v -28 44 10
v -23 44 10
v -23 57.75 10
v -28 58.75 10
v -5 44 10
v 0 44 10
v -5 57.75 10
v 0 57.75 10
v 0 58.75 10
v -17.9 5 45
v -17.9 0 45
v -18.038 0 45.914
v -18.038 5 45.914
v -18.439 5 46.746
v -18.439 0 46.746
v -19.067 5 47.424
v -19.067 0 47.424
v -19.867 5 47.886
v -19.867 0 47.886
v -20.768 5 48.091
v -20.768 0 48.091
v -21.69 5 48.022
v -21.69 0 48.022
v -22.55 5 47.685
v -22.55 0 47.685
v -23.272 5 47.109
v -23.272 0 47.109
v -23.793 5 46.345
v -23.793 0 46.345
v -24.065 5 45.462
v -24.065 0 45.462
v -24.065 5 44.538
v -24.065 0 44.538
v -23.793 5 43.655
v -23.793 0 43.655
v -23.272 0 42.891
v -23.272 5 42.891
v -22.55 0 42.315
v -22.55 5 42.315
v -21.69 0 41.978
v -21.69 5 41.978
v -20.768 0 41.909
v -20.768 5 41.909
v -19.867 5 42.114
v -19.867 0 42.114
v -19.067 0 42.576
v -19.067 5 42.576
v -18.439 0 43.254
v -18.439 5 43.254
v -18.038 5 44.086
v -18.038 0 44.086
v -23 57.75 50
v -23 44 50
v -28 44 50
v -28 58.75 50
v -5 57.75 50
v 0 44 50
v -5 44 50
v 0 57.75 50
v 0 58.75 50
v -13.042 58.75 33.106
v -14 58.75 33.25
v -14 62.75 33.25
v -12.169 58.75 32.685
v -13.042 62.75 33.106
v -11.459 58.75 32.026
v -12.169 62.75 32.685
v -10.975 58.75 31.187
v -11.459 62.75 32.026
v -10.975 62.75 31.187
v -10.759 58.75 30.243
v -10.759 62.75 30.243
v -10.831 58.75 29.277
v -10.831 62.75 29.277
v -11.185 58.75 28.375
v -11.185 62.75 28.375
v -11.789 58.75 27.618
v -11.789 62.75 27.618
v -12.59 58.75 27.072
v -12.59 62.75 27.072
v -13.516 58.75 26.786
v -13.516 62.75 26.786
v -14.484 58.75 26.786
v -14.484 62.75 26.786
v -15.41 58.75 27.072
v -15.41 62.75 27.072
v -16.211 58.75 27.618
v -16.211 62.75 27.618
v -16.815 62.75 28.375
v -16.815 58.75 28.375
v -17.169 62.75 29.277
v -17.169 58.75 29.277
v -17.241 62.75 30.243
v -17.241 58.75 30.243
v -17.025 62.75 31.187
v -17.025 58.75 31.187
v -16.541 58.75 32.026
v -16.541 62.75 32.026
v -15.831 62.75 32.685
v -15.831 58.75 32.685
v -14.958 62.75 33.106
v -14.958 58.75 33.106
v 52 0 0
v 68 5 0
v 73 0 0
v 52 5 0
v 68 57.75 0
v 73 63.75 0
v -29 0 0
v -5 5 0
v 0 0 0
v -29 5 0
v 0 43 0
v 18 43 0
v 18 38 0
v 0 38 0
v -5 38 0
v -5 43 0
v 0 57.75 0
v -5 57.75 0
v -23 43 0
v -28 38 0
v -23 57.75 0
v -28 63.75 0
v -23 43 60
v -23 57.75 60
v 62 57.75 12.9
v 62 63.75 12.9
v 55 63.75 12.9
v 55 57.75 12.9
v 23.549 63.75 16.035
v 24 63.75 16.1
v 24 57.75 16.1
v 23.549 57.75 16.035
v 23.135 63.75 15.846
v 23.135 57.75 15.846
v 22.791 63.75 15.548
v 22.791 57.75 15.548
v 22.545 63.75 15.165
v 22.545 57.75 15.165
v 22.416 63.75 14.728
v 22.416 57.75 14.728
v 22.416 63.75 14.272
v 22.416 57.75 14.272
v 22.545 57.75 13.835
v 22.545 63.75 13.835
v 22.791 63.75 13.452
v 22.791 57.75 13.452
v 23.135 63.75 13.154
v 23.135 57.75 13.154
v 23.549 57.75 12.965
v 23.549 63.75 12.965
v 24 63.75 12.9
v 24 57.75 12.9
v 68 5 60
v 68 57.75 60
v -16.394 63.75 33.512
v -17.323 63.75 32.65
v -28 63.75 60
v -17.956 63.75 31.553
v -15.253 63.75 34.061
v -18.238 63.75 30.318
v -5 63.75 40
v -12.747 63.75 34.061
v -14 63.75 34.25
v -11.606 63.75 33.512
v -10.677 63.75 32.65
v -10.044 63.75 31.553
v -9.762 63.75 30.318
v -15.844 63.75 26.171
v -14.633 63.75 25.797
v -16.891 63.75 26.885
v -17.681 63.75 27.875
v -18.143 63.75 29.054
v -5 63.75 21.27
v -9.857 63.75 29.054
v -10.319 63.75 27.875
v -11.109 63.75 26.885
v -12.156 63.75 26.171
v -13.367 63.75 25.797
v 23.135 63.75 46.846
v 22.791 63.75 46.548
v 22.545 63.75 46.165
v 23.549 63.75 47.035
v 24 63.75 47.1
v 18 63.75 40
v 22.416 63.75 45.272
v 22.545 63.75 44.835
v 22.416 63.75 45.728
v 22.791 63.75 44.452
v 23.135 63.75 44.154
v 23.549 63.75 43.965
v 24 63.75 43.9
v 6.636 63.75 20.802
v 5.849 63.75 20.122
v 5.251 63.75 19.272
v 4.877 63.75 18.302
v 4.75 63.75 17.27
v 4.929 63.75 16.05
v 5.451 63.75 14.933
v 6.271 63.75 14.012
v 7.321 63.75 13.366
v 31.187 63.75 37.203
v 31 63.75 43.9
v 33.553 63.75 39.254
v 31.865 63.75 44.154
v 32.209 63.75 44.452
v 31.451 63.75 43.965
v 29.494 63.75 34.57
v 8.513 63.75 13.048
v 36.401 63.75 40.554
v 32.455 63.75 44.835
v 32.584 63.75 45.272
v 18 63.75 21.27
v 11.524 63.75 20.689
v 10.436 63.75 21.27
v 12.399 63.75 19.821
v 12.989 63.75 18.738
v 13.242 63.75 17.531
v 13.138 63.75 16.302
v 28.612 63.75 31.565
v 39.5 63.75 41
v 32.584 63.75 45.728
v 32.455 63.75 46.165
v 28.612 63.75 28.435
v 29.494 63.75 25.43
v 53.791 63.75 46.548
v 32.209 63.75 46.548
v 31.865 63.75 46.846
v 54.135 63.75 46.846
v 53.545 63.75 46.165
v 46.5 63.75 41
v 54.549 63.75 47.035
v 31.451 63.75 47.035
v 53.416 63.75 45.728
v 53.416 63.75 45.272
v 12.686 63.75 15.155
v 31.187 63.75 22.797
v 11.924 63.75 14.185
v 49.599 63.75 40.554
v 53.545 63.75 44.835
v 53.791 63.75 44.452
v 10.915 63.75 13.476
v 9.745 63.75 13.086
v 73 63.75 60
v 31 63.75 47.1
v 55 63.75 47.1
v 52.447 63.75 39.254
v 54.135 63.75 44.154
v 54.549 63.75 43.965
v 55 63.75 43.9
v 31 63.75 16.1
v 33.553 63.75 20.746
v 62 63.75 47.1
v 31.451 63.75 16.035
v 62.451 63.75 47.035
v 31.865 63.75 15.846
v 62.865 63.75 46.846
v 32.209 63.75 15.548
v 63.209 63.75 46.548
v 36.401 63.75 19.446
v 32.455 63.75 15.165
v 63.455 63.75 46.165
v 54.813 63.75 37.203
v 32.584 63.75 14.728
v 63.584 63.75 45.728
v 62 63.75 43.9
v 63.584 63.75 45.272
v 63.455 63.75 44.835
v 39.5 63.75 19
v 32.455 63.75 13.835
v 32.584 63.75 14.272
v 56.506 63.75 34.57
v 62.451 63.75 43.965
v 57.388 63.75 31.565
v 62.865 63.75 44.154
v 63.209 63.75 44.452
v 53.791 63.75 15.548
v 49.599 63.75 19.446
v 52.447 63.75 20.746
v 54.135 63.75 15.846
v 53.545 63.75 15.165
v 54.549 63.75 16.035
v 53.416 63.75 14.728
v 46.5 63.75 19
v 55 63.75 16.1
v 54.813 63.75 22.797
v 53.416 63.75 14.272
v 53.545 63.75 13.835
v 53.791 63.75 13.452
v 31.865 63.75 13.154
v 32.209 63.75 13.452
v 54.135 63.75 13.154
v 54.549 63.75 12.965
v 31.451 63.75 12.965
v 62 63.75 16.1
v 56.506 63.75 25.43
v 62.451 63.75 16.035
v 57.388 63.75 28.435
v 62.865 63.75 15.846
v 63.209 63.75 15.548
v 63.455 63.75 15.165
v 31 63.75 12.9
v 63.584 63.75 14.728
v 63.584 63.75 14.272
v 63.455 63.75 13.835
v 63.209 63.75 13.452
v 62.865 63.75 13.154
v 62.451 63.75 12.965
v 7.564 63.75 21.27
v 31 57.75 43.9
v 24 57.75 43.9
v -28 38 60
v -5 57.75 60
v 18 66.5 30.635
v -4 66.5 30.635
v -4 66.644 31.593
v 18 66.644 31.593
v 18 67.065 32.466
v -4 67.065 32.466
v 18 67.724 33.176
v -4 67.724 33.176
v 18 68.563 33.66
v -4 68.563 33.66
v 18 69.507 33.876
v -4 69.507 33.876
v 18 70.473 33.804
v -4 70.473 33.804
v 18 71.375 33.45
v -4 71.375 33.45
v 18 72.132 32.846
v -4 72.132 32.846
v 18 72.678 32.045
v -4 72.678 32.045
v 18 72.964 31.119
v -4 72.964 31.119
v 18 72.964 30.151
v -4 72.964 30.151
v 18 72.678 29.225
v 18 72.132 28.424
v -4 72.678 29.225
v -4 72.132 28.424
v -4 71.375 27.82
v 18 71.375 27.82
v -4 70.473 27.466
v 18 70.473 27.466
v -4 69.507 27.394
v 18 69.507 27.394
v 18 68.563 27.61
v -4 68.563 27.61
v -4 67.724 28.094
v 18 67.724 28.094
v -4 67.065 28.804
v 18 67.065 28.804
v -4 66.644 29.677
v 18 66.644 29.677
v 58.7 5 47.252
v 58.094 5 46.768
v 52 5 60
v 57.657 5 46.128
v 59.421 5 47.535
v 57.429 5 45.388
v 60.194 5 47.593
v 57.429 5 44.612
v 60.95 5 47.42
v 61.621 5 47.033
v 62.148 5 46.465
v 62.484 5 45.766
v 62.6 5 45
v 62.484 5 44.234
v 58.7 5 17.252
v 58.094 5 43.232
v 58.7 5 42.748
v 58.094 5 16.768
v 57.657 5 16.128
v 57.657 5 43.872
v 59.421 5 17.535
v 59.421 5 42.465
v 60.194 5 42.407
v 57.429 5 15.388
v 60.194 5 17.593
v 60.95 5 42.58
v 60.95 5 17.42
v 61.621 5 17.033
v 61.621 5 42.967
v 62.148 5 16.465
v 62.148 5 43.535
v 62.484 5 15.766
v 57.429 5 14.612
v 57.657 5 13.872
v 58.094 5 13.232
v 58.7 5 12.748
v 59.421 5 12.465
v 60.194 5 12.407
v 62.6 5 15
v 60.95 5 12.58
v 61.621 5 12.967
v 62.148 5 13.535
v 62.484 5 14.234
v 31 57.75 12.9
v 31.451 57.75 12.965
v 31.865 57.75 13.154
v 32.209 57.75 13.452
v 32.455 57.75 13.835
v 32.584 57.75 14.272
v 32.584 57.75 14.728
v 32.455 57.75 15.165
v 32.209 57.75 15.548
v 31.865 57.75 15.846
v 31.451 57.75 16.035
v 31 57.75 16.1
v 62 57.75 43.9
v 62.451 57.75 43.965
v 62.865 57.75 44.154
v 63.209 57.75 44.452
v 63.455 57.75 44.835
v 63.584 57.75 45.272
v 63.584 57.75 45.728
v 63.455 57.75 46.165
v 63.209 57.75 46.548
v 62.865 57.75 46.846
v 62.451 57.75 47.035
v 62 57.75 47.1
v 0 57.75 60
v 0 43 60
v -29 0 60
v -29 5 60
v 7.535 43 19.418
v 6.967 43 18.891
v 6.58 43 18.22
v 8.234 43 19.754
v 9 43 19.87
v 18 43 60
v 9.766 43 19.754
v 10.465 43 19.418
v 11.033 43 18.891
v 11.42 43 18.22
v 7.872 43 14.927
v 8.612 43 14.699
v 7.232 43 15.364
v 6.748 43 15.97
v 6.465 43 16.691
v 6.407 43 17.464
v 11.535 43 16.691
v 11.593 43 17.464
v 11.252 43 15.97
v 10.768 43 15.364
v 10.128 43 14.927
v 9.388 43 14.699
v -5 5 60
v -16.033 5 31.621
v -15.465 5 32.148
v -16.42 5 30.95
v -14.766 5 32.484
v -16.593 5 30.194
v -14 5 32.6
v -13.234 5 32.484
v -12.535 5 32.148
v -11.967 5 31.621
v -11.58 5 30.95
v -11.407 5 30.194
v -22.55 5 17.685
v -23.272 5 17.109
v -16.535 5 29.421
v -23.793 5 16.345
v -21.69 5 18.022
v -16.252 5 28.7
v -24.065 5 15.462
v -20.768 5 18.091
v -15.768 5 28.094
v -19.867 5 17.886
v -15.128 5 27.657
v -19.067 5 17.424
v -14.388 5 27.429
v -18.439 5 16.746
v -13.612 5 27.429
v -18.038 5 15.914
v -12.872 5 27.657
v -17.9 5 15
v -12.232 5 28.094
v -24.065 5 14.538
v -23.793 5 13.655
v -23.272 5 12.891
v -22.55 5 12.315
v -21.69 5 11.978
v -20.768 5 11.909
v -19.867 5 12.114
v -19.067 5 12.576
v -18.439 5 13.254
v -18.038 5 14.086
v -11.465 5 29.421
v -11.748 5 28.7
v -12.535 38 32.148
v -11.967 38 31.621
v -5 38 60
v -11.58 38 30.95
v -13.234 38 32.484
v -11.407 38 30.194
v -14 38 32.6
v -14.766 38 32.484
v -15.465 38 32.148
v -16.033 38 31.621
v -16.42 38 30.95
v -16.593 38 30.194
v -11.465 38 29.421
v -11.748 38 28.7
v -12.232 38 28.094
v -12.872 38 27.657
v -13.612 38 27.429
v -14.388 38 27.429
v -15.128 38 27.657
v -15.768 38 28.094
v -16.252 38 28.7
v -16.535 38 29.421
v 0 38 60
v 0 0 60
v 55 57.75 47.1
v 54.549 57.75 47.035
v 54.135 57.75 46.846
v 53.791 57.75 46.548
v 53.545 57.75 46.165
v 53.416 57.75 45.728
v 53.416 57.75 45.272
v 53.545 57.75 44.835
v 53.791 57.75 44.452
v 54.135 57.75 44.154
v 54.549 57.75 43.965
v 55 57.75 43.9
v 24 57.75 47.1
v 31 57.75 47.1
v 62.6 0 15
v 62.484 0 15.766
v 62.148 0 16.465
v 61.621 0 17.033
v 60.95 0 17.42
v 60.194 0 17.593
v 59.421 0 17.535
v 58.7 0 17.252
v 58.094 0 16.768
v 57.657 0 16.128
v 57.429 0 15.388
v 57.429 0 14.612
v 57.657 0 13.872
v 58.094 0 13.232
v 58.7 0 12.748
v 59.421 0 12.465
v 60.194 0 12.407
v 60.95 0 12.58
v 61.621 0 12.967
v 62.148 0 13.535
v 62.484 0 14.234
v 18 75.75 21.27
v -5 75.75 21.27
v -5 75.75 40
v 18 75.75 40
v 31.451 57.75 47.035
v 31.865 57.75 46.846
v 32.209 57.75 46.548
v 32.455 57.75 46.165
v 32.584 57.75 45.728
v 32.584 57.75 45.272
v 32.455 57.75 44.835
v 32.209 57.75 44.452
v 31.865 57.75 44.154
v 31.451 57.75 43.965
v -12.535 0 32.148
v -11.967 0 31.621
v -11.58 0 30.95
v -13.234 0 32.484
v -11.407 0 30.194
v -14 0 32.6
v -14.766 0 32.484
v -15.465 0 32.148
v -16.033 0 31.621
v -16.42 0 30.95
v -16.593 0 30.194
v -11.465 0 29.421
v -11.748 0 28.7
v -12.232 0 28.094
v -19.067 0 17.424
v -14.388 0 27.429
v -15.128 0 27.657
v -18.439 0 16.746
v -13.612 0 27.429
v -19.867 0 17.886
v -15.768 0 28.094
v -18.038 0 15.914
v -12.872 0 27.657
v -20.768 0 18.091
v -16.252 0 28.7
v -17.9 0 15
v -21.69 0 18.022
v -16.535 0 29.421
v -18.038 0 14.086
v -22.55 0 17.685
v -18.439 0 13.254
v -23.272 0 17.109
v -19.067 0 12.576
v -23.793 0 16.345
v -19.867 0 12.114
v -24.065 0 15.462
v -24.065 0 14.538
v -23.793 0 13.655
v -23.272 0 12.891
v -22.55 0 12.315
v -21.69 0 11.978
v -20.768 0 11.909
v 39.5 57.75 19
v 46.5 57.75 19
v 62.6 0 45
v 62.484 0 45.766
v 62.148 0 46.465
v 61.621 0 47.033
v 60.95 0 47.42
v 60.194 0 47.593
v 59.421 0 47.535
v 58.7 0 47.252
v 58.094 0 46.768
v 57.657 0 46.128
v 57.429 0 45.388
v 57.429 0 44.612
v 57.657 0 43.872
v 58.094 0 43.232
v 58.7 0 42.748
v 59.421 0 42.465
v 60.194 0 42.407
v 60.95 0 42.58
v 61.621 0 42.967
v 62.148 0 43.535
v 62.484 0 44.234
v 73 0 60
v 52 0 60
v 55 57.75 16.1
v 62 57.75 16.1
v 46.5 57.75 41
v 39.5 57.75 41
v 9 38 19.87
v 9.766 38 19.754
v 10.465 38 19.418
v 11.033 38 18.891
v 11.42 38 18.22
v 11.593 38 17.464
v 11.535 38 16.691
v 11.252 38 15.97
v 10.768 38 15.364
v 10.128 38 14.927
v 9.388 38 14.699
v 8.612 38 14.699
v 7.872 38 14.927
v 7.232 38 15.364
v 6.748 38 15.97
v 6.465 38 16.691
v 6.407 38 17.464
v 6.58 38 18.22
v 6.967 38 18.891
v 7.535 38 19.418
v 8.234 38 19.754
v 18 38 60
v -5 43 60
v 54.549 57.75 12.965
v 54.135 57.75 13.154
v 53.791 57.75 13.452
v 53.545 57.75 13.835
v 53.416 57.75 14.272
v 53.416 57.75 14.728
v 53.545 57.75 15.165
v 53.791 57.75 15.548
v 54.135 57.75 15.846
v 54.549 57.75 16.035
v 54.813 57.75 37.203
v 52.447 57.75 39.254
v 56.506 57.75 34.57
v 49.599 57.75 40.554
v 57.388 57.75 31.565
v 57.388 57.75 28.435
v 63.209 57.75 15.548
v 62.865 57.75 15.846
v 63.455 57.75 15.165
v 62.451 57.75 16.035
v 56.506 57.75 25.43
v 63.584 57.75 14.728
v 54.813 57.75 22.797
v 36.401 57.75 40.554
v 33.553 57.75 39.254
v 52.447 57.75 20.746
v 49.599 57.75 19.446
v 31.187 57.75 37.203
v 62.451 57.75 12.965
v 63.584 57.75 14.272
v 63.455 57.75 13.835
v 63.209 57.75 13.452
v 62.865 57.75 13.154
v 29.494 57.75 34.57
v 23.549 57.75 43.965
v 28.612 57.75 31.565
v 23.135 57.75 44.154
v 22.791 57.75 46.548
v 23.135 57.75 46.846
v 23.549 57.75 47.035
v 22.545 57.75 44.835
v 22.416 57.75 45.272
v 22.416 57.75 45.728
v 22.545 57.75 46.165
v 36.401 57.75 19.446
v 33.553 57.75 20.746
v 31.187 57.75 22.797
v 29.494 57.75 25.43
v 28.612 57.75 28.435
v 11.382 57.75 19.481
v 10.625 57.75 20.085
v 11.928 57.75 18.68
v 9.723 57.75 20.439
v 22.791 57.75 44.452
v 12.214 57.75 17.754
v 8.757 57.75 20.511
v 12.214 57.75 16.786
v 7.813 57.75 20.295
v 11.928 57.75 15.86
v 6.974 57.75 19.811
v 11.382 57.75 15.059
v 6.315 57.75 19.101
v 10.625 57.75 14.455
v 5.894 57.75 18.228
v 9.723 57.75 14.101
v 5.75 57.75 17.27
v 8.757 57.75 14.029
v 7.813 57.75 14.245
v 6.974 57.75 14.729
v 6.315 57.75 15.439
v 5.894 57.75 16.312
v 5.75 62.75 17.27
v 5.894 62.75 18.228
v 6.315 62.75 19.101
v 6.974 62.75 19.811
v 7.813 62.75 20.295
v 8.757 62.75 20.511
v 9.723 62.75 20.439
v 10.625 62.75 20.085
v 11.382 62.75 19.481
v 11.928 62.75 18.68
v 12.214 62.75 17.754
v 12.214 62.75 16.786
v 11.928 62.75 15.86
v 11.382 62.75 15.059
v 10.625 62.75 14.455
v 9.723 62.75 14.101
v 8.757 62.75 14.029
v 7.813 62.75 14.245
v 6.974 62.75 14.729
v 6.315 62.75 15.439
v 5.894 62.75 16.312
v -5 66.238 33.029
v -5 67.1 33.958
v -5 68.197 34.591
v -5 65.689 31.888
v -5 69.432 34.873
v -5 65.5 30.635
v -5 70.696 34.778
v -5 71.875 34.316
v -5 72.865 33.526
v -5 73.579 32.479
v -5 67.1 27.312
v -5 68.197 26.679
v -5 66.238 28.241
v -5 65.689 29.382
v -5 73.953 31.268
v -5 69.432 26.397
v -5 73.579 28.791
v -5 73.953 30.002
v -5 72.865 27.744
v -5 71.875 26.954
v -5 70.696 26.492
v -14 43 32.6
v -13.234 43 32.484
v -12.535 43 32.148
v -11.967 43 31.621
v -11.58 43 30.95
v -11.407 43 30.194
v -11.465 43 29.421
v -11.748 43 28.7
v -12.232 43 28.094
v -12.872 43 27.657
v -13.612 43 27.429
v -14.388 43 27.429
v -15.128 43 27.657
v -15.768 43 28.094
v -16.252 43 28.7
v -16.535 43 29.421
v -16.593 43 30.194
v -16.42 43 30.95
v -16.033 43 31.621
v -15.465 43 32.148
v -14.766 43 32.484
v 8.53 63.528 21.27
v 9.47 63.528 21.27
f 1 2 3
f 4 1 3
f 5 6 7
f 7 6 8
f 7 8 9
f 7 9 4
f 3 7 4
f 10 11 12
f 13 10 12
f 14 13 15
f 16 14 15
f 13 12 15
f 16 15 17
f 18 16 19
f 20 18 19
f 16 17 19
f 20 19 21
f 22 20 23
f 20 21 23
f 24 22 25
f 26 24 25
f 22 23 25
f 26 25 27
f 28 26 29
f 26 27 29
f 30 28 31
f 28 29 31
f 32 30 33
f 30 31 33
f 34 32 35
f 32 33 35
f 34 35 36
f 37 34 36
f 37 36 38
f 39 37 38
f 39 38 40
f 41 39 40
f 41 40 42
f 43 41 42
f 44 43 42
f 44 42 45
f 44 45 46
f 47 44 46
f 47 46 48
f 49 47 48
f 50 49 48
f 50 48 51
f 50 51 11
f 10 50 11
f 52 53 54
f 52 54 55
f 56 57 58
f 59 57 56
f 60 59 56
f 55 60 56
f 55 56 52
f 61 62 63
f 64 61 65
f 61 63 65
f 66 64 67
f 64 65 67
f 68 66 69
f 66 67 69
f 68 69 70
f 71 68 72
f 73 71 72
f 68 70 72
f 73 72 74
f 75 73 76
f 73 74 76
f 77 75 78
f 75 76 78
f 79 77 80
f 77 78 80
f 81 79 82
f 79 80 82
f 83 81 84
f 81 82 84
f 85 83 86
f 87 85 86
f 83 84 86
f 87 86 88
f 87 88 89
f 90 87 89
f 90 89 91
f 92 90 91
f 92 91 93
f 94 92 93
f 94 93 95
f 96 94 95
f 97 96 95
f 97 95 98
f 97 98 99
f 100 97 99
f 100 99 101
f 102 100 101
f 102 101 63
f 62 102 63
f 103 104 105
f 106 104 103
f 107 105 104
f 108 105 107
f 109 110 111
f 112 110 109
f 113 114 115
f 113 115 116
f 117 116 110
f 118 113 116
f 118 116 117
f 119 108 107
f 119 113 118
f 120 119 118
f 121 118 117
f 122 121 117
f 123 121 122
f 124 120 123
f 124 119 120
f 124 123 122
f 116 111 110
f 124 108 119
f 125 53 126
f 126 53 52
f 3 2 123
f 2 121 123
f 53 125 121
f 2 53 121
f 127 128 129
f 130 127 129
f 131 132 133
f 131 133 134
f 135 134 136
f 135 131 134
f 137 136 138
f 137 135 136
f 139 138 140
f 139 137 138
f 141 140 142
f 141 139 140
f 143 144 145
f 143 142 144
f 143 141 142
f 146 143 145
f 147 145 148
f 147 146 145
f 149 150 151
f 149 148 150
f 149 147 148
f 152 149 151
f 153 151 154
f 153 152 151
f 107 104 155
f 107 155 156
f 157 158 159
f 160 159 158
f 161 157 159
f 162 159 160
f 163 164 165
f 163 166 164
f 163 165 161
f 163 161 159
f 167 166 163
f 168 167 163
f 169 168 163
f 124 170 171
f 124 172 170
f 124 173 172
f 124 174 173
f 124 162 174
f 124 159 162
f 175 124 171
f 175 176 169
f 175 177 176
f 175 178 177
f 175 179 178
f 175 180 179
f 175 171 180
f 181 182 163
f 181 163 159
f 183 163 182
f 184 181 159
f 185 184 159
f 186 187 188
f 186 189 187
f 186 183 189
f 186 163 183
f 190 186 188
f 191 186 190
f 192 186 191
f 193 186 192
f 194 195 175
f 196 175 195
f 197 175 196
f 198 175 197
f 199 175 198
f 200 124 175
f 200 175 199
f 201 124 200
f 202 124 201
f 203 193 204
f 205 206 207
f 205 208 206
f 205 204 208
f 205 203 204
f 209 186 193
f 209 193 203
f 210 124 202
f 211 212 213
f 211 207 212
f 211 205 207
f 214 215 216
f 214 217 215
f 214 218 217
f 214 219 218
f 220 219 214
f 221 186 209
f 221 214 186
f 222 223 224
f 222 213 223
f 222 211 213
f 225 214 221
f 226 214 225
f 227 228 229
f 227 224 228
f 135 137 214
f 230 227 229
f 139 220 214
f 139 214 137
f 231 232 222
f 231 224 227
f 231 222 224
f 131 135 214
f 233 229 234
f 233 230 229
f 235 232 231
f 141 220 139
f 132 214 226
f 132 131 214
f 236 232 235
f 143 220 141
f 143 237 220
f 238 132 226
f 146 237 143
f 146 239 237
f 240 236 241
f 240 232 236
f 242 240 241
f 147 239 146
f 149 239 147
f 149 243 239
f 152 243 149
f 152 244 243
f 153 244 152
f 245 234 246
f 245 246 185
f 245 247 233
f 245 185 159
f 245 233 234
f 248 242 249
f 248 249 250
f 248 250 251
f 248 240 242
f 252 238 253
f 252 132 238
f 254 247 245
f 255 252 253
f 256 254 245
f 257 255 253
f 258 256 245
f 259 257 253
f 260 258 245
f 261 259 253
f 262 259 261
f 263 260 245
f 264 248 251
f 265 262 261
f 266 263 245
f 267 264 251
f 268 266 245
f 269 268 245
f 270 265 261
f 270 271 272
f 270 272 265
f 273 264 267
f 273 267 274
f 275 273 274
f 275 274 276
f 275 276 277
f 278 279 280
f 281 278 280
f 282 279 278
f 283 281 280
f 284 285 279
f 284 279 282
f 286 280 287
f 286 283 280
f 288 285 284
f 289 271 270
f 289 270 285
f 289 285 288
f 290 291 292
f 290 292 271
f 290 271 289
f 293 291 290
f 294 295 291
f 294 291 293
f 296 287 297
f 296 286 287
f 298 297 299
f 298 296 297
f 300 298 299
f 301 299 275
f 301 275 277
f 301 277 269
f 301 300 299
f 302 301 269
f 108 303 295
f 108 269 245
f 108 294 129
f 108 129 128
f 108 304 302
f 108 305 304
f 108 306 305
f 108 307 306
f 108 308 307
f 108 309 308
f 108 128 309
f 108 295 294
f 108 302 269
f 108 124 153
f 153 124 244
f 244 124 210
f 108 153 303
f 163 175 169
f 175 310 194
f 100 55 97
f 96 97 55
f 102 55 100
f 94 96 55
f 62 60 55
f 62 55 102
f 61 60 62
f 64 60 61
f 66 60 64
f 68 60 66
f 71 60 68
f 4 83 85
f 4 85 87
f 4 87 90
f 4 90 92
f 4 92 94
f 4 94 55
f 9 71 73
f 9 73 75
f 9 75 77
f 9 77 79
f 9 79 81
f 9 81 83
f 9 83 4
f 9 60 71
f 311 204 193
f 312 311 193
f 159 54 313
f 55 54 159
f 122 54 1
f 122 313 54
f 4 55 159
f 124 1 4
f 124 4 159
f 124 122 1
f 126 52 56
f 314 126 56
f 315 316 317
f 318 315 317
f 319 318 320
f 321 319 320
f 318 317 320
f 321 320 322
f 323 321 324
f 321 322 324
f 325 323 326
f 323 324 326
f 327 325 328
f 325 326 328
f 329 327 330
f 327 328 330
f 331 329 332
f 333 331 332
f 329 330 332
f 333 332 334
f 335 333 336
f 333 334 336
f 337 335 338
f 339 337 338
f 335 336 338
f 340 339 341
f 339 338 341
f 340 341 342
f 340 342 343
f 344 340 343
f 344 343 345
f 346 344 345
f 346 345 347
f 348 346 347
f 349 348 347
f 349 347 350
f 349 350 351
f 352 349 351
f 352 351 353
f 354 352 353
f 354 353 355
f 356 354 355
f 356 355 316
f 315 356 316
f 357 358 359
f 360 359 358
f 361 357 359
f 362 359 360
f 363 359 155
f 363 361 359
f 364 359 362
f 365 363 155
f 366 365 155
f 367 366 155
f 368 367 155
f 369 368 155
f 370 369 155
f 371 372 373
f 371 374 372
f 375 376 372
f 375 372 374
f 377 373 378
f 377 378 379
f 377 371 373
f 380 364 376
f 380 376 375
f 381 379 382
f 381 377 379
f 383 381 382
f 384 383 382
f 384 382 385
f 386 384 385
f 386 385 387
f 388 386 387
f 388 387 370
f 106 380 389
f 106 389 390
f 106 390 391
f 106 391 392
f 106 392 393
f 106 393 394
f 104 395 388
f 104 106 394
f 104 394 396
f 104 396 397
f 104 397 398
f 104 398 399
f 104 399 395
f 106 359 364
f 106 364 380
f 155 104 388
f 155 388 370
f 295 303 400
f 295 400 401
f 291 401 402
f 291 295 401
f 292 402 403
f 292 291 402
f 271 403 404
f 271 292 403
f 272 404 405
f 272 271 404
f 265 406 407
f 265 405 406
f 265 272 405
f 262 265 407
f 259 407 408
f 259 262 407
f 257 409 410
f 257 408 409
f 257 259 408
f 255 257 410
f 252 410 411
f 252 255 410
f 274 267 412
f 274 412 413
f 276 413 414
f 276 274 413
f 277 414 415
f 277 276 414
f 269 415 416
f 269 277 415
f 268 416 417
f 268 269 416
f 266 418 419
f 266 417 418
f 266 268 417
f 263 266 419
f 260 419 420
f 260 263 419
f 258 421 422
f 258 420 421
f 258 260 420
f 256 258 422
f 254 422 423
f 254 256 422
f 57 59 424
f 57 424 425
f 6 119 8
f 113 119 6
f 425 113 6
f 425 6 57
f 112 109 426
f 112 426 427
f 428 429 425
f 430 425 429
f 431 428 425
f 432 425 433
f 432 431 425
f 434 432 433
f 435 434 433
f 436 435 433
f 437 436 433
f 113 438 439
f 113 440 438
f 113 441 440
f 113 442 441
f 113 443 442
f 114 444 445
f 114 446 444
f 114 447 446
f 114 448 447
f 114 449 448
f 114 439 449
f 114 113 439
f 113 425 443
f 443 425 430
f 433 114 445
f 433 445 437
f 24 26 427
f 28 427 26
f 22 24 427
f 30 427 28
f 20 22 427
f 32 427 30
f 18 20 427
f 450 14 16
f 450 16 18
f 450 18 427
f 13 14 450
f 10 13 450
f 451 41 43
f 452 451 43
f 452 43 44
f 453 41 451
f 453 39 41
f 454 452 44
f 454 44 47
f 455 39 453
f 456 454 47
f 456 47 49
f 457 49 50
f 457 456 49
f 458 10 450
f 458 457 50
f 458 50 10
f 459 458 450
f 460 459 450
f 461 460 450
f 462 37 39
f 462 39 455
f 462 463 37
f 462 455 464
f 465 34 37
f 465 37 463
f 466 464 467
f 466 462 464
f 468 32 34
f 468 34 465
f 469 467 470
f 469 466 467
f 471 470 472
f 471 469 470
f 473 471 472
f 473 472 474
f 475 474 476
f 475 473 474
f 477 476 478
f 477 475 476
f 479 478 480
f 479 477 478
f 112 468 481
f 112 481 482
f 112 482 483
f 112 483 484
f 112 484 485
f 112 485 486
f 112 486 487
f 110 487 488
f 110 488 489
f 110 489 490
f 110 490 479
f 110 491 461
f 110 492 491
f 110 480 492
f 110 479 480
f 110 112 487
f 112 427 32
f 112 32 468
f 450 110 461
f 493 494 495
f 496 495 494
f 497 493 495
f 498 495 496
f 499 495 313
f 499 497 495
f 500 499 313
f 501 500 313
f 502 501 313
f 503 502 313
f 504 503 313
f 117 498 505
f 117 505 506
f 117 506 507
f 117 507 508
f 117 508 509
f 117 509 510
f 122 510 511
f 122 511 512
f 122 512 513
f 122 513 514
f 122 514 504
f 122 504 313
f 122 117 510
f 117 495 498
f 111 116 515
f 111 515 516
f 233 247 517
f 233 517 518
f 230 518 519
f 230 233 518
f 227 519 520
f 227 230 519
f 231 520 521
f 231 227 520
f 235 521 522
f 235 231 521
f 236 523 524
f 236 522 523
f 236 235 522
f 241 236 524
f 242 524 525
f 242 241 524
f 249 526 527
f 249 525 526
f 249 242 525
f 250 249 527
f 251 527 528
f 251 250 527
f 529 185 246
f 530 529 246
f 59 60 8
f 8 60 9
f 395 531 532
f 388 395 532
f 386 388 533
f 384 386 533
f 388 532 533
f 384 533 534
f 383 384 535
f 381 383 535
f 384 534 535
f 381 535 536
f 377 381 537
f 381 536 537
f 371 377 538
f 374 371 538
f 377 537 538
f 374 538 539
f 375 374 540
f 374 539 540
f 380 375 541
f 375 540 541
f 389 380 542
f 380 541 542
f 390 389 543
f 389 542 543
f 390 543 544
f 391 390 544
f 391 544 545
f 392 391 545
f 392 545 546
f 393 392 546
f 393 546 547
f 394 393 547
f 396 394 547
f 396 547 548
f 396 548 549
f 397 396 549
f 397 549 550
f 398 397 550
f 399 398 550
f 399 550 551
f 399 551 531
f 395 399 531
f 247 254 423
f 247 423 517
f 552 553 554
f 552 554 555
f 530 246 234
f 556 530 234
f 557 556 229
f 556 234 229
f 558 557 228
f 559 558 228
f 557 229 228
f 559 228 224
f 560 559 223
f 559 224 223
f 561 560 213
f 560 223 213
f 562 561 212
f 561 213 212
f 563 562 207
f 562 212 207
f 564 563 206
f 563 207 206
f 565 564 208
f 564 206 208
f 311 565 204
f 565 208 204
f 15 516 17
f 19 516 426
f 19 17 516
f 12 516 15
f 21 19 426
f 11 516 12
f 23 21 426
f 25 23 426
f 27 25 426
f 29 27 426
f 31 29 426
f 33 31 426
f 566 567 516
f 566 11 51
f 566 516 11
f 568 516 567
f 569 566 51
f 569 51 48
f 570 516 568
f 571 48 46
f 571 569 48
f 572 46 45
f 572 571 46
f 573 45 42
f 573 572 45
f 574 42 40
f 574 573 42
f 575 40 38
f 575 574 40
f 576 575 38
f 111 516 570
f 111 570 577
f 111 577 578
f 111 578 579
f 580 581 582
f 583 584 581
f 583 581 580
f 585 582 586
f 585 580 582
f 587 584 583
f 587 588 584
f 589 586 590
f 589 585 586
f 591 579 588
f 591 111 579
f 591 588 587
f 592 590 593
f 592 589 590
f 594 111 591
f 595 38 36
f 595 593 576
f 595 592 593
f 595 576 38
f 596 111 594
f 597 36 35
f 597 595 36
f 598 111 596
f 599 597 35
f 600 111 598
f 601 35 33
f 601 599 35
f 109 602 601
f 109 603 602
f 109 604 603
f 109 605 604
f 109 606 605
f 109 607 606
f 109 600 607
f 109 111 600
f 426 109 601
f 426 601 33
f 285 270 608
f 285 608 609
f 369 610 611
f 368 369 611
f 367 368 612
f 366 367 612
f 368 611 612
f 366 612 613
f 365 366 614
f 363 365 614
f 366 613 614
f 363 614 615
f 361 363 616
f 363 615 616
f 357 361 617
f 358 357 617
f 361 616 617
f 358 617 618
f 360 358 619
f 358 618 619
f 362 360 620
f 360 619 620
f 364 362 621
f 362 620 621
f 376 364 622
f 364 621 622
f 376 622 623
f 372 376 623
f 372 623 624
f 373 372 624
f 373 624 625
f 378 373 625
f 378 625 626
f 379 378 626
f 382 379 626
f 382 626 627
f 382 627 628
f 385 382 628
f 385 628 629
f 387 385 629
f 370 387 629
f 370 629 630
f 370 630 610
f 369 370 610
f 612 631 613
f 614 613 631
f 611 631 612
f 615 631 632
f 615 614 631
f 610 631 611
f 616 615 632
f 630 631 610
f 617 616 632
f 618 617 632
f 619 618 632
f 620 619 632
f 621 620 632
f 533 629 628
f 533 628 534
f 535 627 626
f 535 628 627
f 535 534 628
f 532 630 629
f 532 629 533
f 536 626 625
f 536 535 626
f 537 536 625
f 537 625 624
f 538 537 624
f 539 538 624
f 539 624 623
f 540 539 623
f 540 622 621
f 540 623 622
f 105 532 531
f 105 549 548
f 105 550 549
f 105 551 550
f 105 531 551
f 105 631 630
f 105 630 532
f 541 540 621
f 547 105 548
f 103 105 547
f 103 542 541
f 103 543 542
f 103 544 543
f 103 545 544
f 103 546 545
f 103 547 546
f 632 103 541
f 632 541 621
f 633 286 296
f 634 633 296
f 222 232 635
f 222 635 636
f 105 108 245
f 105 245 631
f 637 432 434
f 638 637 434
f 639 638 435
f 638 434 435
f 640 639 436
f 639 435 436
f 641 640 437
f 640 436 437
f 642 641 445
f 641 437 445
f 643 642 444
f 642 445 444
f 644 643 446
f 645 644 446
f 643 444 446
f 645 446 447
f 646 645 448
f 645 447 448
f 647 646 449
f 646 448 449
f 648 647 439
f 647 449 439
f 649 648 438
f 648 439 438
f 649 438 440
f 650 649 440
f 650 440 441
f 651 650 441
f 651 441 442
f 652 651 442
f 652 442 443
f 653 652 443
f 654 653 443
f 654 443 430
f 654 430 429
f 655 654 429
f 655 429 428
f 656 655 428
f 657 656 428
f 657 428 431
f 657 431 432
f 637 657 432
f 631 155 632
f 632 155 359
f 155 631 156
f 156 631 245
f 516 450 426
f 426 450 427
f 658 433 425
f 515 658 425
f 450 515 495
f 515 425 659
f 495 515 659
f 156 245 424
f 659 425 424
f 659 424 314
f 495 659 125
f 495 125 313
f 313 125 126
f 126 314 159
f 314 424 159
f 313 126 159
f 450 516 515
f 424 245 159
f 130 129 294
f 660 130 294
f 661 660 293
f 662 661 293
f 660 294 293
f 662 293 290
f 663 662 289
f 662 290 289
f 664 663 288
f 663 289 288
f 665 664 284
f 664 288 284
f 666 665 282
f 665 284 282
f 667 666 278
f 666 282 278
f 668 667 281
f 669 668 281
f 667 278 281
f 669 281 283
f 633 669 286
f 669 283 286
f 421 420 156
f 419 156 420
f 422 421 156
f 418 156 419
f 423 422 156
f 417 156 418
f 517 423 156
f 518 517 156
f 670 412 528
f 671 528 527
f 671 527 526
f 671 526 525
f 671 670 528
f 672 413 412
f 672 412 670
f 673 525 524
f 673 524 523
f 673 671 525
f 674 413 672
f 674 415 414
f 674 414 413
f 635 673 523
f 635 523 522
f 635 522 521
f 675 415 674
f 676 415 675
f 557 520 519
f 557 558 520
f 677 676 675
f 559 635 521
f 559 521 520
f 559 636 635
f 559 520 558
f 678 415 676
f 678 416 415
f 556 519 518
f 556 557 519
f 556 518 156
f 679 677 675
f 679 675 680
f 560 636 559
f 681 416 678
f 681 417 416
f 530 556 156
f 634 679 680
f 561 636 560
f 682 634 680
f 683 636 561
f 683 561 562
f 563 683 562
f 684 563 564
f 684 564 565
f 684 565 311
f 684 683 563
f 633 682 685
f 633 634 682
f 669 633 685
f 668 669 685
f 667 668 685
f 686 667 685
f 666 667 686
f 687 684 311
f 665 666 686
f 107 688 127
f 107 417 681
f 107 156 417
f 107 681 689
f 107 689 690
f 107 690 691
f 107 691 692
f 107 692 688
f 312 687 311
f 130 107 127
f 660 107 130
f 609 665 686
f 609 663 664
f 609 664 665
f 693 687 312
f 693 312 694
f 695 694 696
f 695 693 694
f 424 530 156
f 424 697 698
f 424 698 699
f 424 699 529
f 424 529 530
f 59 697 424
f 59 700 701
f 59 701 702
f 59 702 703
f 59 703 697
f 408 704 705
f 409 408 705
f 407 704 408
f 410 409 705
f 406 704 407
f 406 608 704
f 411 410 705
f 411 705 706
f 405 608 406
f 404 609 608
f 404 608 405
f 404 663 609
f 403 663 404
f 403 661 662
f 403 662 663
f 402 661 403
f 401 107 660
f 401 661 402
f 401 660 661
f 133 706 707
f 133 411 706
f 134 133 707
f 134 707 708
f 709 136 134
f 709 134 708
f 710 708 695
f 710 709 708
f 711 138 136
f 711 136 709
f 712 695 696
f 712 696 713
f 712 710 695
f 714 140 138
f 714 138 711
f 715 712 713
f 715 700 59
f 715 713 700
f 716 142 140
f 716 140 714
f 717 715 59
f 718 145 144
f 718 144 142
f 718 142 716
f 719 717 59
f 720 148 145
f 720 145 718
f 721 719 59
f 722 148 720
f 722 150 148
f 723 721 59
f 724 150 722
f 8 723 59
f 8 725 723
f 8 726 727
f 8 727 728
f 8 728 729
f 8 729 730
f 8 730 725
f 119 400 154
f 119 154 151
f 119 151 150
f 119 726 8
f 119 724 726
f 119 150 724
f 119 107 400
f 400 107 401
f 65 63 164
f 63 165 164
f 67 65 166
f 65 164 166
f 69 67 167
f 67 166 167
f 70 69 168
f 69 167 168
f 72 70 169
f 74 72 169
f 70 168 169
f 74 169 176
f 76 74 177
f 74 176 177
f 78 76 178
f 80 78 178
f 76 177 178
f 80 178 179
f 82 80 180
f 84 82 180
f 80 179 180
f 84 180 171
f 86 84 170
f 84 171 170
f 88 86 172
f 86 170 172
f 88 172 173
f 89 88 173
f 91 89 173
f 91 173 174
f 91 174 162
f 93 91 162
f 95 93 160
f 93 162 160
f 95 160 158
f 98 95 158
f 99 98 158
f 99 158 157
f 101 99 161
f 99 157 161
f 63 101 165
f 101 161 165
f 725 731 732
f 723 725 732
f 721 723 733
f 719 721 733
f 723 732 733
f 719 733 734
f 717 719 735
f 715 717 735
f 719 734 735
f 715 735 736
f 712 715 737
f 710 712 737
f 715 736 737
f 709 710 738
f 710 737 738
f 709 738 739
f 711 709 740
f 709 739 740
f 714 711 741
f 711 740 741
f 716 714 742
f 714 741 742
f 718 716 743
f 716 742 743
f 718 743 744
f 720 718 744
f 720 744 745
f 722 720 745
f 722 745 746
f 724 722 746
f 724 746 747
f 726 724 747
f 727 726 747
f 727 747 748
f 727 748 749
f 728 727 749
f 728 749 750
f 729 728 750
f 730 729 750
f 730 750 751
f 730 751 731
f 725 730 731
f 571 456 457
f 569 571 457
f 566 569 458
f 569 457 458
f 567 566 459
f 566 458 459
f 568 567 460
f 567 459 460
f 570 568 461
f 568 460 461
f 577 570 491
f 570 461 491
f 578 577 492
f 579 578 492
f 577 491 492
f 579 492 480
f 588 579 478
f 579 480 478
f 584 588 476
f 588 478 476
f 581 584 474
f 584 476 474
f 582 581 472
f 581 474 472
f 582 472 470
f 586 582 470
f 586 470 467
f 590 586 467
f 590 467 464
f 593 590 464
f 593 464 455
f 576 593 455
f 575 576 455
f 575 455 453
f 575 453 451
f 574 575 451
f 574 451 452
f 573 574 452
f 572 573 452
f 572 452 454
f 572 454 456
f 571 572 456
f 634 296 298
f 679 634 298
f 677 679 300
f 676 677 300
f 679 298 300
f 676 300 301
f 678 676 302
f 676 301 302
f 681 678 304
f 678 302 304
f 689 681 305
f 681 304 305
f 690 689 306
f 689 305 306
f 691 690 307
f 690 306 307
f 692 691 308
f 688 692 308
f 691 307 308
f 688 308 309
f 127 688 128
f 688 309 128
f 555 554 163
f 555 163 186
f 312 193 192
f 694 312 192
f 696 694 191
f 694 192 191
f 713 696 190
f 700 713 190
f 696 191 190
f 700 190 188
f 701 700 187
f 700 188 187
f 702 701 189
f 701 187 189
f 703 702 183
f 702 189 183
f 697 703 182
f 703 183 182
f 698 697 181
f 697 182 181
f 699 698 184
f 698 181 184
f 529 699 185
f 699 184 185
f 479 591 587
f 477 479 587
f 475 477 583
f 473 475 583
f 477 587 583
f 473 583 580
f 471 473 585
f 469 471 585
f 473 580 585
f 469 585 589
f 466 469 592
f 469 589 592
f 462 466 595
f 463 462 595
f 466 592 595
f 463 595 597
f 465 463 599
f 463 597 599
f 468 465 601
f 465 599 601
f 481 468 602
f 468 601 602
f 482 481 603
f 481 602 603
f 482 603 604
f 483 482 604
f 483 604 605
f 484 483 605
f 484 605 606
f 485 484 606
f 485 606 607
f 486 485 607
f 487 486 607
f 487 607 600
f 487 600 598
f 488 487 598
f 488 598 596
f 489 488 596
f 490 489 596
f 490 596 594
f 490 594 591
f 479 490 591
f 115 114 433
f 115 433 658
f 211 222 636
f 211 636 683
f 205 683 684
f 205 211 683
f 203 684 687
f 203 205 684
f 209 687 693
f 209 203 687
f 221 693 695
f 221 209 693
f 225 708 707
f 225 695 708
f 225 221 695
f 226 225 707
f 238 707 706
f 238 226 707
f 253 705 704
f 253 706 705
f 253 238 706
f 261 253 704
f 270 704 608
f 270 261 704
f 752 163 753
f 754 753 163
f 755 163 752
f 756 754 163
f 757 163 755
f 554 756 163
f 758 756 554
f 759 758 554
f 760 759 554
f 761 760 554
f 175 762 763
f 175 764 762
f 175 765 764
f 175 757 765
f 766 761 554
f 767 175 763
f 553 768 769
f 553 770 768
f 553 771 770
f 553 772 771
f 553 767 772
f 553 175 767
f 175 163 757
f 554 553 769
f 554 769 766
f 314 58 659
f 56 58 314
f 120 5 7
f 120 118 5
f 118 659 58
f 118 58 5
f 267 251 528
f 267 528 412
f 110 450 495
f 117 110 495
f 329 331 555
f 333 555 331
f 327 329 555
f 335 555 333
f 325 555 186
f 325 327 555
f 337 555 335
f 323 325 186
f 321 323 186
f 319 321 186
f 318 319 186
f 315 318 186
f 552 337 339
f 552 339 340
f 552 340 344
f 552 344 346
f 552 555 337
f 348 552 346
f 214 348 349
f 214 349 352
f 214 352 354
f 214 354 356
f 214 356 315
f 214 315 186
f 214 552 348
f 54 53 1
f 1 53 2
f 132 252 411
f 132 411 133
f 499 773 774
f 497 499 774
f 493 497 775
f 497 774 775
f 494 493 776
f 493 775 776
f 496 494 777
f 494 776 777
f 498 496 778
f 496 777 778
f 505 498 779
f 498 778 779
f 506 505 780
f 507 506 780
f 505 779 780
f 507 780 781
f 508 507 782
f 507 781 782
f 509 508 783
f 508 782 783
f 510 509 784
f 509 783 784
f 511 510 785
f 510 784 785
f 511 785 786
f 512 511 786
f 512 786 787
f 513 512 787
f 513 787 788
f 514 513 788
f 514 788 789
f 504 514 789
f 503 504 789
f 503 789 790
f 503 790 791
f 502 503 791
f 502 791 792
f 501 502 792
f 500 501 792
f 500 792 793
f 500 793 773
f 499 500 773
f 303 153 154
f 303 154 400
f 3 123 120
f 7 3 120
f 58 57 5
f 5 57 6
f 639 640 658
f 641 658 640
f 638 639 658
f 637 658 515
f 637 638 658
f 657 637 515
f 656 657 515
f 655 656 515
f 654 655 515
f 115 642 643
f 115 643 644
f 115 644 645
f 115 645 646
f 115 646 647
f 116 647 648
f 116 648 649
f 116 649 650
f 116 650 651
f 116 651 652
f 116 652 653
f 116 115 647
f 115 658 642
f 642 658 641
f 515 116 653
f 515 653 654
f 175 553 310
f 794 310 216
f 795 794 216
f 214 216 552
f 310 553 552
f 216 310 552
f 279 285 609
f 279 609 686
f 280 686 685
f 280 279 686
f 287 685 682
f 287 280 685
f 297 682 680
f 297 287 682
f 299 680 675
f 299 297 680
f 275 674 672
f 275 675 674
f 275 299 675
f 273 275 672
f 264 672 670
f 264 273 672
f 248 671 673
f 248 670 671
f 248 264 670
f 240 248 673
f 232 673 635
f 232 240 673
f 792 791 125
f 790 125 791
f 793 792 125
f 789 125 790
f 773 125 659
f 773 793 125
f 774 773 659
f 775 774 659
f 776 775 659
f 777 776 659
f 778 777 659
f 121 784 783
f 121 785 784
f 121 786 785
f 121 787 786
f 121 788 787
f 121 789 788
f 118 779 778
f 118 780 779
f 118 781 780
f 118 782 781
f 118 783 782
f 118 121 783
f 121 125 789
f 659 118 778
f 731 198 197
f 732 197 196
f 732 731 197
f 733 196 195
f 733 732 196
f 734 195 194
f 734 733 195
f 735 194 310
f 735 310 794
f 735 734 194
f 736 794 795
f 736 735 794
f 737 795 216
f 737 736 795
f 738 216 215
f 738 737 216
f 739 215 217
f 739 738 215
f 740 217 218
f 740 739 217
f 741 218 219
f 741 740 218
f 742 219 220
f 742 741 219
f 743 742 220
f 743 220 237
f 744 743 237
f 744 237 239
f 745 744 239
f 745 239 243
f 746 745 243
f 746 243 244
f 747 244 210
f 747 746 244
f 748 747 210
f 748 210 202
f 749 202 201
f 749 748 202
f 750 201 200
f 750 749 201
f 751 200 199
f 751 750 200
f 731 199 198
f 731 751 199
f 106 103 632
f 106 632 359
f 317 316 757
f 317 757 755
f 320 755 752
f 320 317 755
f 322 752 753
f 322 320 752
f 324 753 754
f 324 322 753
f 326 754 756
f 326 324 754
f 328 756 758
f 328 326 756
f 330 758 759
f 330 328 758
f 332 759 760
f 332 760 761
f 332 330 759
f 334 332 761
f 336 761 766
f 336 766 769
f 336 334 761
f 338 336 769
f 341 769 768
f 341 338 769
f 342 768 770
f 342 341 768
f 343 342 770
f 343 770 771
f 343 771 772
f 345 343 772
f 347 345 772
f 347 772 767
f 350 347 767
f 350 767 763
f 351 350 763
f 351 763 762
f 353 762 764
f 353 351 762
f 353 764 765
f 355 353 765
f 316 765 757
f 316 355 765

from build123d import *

# Parameters (mm, degrees)
SKETCH1_W           = 18
SKETCH1_H           = 14.75
BOSS_EXTRUDE1_DEPTH = 60
CUT_EXTRUDE1_REACH  = 123.108
SKETCH2_W           = 40
SKETCH2_H           = 14.75
CUT_EXTRUDE2_REACH  = 115.987
CUT_EXTRUDE3_REACH  = 123.108
SKETCH5_R           = 3.25
CUT_EXTRUDE4_REACH  = 105.817
SKETCH6_R           = 2.6
SKETCH7_R           = 2.6
CUT_EXTRUDE5_DEPTH  = 114.9871155
CUT_EXTRUDE6_REACH  = 115.987
SKETCH8_R           = 3.25
SKETCH9_W           = 23
SKETCH9_H           = 21.27
SKETCH9_H_2         = 20
CUT_EXTRUDE7_DEPTH  = 12
CHAMFER1_SIZE       = 1
CUT_EXTRUDE8_REACH  = 123.108
SKETCH10_R          = 3.1
SKETCH10_R_2        = 2.6
SKETCH11_R          = 3.25
CUT_EXTRUDE9_DEPTH  = 125.185596991
CHAMFER2_SIZE       = 1


with BuildPart() as part:
    # Sketch1 → Boss-Extrude1 (new body)
    with BuildSketch(Plane.XY):
        Polygon((0, 0), (-29, 0), (-29, 5), (-5, 5), (-5, 38), (-28, 38), (-28, 63.75), (-5, 63.75), (-5, 75.75), (18, 75.75), (18, 63.75), (73, 63.75), (73, 0), (52, 0), (52, 5), (68, 5), (68, 57.75), (0, 57.75), (0, 43), (18, 43), (18, 38), (0, 38), align=None)
        with Locations((-14, 50.375)):
            Rectangle(SKETCH1_W, SKETCH1_H, mode=Mode.SUBTRACT)
    extrude(amount=BOSS_EXTRUDE1_DEPTH)

    # Sketch2 → Cut-Extrude1 (cut, up to next)
    with BuildSketch(Plane(origin=(0, 0, 0), x_dir=(0, 0, -1), z_dir=(1, 0, 0)), mode=Mode.PRIVATE) as cut_extrude1_sk1:
        with Locations((-30, 51.375)):
            Rectangle(SKETCH2_W, SKETCH2_H)
    cut_extrude1_tool1 = extrude(cut_extrude1_sk1.sketch, amount=-CUT_EXTRUDE1_REACH, mode=Mode.PRIVATE) & part.part
    add(cut_extrude1_tool1.solids().sort_by_distance((0, 51.375, 30))[0], mode=Mode.SUBTRACT)

    # Sketch3 → Cut-Extrude2 (cut, up to next)
    with BuildSketch(Plane(origin=(0, 63.75, 0), x_dir=(1, 0, 0), z_dir=(0, 1, 0)), mode=Mode.PRIVATE) as cut_extrude2_sk1:
        with BuildLine():
            Line((39.5, -19), (46.5, -19))
            ThreePointArc((46.5, -19), (57.5, -30), (46.5, -41))
            Line((46.5, -41), (39.5, -41))
            ThreePointArc((39.5, -41), (28.5, -30), (39.5, -19))
        make_face()
    cut_extrude2_tool1 = extrude(cut_extrude2_sk1.sketch, amount=-CUT_EXTRUDE2_REACH, mode=Mode.PRIVATE) & part.part
    # Sketch3 → Cut-Extrude2 (cut, up to next)
    with BuildSketch(Plane(origin=(0, 63.75, 0), x_dir=(1, 0, 0), z_dir=(0, 1, 0)), mode=Mode.PRIVATE) as cut_extrude2_sk2:
        with BuildLine():
            Line((31, -16.1), (24, -16.1))
            ThreePointArc((24, -16.1), (22.4, -14.5), (24, -12.9))
            Line((24, -12.9), (31, -12.9))
            ThreePointArc((31, -12.9), (32.6, -14.5), (31, -16.1))
        make_face()
    cut_extrude2_tool2 = extrude(cut_extrude2_sk2.sketch, amount=-CUT_EXTRUDE2_REACH, mode=Mode.PRIVATE) & part.part
    # Sketch3 → Cut-Extrude2 (cut, up to next)
    with BuildSketch(Plane(origin=(0, 63.75, 0), x_dir=(1, 0, 0), z_dir=(0, 1, 0)), mode=Mode.PRIVATE) as cut_extrude2_sk3:
        with BuildLine():
            Line((55, -16.1), (62, -16.1))
            ThreePointArc((62, -16.1), (63.6, -14.5), (62, -12.9))
            Line((62, -12.9), (55, -12.9))
            ThreePointArc((55, -12.9), (53.4, -14.5), (55, -16.1))
        make_face()
    cut_extrude2_tool3 = extrude(cut_extrude2_sk3.sketch, amount=-CUT_EXTRUDE2_REACH, mode=Mode.PRIVATE) & part.part
    # Sketch3 → Cut-Extrude2 (cut, up to next)
    with BuildSketch(Plane(origin=(0, 63.75, 0), x_dir=(1, 0, 0), z_dir=(0, 1, 0)), mode=Mode.PRIVATE) as cut_extrude2_sk4:
        with BuildLine():
            Line((31, -43.9), (24, -43.9))
            ThreePointArc((24, -43.9), (22.4, -45.5), (24, -47.1))
            Line((24, -47.1), (31, -47.1))
            ThreePointArc((31, -47.1), (32.6, -45.5), (31, -43.9))
        make_face()
    cut_extrude2_tool4 = extrude(cut_extrude2_sk4.sketch, amount=-CUT_EXTRUDE2_REACH, mode=Mode.PRIVATE) & part.part
    # Sketch3 → Cut-Extrude2 (cut, up to next)
    with BuildSketch(Plane(origin=(0, 63.75, 0), x_dir=(1, 0, 0), z_dir=(0, 1, 0)), mode=Mode.PRIVATE) as cut_extrude2_sk5:
        with BuildLine():
            Line((55, -43.9), (62, -43.9))
            ThreePointArc((62, -43.9), (63.6, -45.5), (62, -47.1))
            Line((62, -47.1), (55, -47.1))
            ThreePointArc((55, -47.1), (53.4, -45.5), (55, -43.9))
        make_face()
    cut_extrude2_tool5 = extrude(cut_extrude2_sk5.sketch, amount=-CUT_EXTRUDE2_REACH, mode=Mode.PRIVATE) & part.part
    add(cut_extrude2_tool1.solids().sort_by_distance((43, 63.75, 30))[0], mode=Mode.SUBTRACT)
    add(cut_extrude2_tool2.solids().sort_by_distance((27.5, 63.75, 14.5))[0], mode=Mode.SUBTRACT)
    add(cut_extrude2_tool3.solids().sort_by_distance((58.5, 63.75, 14.5))[0], mode=Mode.SUBTRACT)
    add(cut_extrude2_tool4.solids().sort_by_distance((27.5, 63.75, 45.5))[0], mode=Mode.SUBTRACT)
    add(cut_extrude2_tool5.solids().sort_by_distance((58.5, 63.75, 45.5))[0], mode=Mode.SUBTRACT)

    # Sketch5 → Cut-Extrude3 (cut, up to next)
    with BuildSketch(Plane(origin=(0, 75.75, 0), x_dir=(1, 0, 0), z_dir=(0, 1, 0)), mode=Mode.PRIVATE) as cut_extrude3_sk1:
        with Locations(Location((9, -17.27, 0), (0, 0, 180))):
            Circle(SKETCH5_R)
    cut_extrude3_tool1 = extrude(cut_extrude3_sk1.sketch, amount=-CUT_EXTRUDE3_REACH, mode=Mode.PRIVATE) & part.part
    add(cut_extrude3_tool1.solids().sort_by_distance((9, 75.75, 17.27))[0], mode=Mode.SUBTRACT)

    # Sketch6 → Cut-Extrude4 (cut, up to next)
    with BuildSketch(Plane(origin=(0, 43, 0), x_dir=(1, 0, 0), z_dir=(0, 1, 0)), mode=Mode.PRIVATE) as cut_extrude4_sk1:
        with Locations(Location((9, -17.27, 0), (0, 0, 270))):
            Circle(SKETCH6_R)
    cut_extrude4_tool1 = extrude(cut_extrude4_sk1.sketch, amount=-CUT_EXTRUDE4_REACH, mode=Mode.PRIVATE) & part.part
    add(cut_extrude4_tool1.solids().sort_by_distance((9, 43, 17.27))[0], mode=Mode.SUBTRACT)

    # Sketch7 → Cut-Extrude5 (cut, through all)
    with BuildSketch(Plane(origin=(0, 63.75, 0), x_dir=(1, 0, 0), z_dir=(0, 1, 0))):
        with Locations(Location((-14, -30, 0), (0, 0, 270))):
            Circle(SKETCH7_R)
    extrude(amount=-CUT_EXTRUDE5_DEPTH, mode=Mode.SUBTRACT)

    # Sketch8 → Cut-Extrude6 (cut, up to next)
    with BuildSketch(Plane(origin=(0, 63.75, 0), x_dir=(1, 0, 0), z_dir=(0, 1, 0)), mode=Mode.PRIVATE) as cut_extrude6_sk1:
        with Locations(Location((-14, -30, 0), (0, 0, 270))):
            Circle(SKETCH8_R)
    cut_extrude6_tool1 = extrude(cut_extrude6_sk1.sketch, amount=-CUT_EXTRUDE6_REACH, mode=Mode.PRIVATE) & part.part
    add(cut_extrude6_tool1.solids().sort_by_distance((-14, 63.75, 30))[0], mode=Mode.SUBTRACT)

    # Sketch9 → Cut-Extrude7 (cut)
    with BuildSketch(Plane(origin=(0, 75.75, 0), x_dir=(1, 0, 0), z_dir=(0, 1, 0))):
        with Locations((6.5, -10.635)):
            Rectangle(SKETCH9_W, SKETCH9_H)
        with Locations((6.5, -50)):
            Rectangle(SKETCH9_W, SKETCH9_H_2)
    extrude(amount=-CUT_EXTRUDE7_DEPTH, mode=Mode.SUBTRACT)

    # Chamfer1
    # the kernel refuses this chamfer: 1 mm, written as the material it takes off along each edge
    with BuildSketch(Plane(origin=(-14, 63.75, 30), x_dir=(0, 0, 1), z_dir=(-1, 0, 0))) as chamfer1_piece_1:
        Polygon((3.25, -CHAMFER1_SIZE), (3.25 + CHAMFER1_SIZE, 0), (3.25, 0), align=None)
    revolve(axis=Axis((-14, 63.75, 30), (0, 1, 0)), mode=Mode.SUBTRACT)
    with BuildSketch(Plane(origin=(9, 63.75, 17.27), x_dir=(-1, 0, 0), z_dir=(0, 0, -1))) as chamfer1_piece_2_section:
        Polygon((3.25 + CHAMFER1_SIZE, 0), (3.25, -CHAMFER1_SIZE), (3.25, 0), align=None)
    chamfer1_piece_2 = revolve(axis=Axis((9, 63.75, 17.27), (0, 1, 0)), mode=Mode.PRIVATE)
    chamfer1_piece_2 = split(chamfer1_piece_2, bisect_by=Plane(origin=(12.733674615, 63.266325385, 21.27), z_dir=(0, 0, -1)), keep=Keep.TOP, mode=Mode.PRIVATE)
    add(chamfer1_piece_2, mode=Mode.SUBTRACT)

    # Sketch10 → Cut-Extrude8 (cut, up to next)
    with BuildSketch(Plane.XZ, mode=Mode.PRIVATE) as cut_extrude8_sk1:
        with Locations((-21, 45)):
            Circle(SKETCH10_R)
    cut_extrude8_tool1 = extrude(cut_extrude8_sk1.sketch, amount=-CUT_EXTRUDE8_REACH, mode=Mode.PRIVATE) & part.part
    # Sketch10 → Cut-Extrude8 (cut, up to next)
    with BuildSketch(Plane.XZ, mode=Mode.PRIVATE) as cut_extrude8_sk2:
        with Locations((-21, 15)):
            Circle(SKETCH10_R)
    cut_extrude8_tool2 = extrude(cut_extrude8_sk2.sketch, amount=-CUT_EXTRUDE8_REACH, mode=Mode.PRIVATE) & part.part
    # Sketch10 → Cut-Extrude8 (cut, up to next)
    with BuildSketch(Plane.XZ, mode=Mode.PRIVATE) as cut_extrude8_sk3:
        with Locations((60, 15)):
            Circle(SKETCH10_R_2)
    cut_extrude8_tool3 = extrude(cut_extrude8_sk3.sketch, amount=-CUT_EXTRUDE8_REACH, mode=Mode.PRIVATE) & part.part
    # Sketch10 → Cut-Extrude8 (cut, up to next)
    with BuildSketch(Plane.XZ, mode=Mode.PRIVATE) as cut_extrude8_sk4:
        with Locations((60, 45)):
            Circle(SKETCH10_R_2)
    cut_extrude8_tool4 = extrude(cut_extrude8_sk4.sketch, amount=-CUT_EXTRUDE8_REACH, mode=Mode.PRIVATE) & part.part
    add(cut_extrude8_tool1.solids().sort_by_distance((-21, 0, 45))[0], mode=Mode.SUBTRACT)
    add(cut_extrude8_tool2.solids().sort_by_distance((-21, 0, 15))[0], mode=Mode.SUBTRACT)
    add(cut_extrude8_tool3.solids().sort_by_distance((60, 0, 15))[0], mode=Mode.SUBTRACT)
    add(cut_extrude8_tool4.solids().sort_by_distance((60, 0, 45))[0], mode=Mode.SUBTRACT)

    # Sketch11 → Cut-Extrude9 (cut, through all)
    with BuildSketch(Plane.ZY.offset(5)):
        with Locations(Location((30.635, 69.75, 0), (0, 0, 270))):
            Circle(SKETCH11_R)
    extrude(amount=-CUT_EXTRUDE9_DEPTH, mode=Mode.SUBTRACT)

    # Chamfer2
    chamfer2_edges = [part.edges().sort_by_distance(p)[0] for p in [
        (-5, 73, 30.635),
    ]]
    chamfer(chamfer2_edges, length=CHAMFER2_SIZE)


solid = part.part
